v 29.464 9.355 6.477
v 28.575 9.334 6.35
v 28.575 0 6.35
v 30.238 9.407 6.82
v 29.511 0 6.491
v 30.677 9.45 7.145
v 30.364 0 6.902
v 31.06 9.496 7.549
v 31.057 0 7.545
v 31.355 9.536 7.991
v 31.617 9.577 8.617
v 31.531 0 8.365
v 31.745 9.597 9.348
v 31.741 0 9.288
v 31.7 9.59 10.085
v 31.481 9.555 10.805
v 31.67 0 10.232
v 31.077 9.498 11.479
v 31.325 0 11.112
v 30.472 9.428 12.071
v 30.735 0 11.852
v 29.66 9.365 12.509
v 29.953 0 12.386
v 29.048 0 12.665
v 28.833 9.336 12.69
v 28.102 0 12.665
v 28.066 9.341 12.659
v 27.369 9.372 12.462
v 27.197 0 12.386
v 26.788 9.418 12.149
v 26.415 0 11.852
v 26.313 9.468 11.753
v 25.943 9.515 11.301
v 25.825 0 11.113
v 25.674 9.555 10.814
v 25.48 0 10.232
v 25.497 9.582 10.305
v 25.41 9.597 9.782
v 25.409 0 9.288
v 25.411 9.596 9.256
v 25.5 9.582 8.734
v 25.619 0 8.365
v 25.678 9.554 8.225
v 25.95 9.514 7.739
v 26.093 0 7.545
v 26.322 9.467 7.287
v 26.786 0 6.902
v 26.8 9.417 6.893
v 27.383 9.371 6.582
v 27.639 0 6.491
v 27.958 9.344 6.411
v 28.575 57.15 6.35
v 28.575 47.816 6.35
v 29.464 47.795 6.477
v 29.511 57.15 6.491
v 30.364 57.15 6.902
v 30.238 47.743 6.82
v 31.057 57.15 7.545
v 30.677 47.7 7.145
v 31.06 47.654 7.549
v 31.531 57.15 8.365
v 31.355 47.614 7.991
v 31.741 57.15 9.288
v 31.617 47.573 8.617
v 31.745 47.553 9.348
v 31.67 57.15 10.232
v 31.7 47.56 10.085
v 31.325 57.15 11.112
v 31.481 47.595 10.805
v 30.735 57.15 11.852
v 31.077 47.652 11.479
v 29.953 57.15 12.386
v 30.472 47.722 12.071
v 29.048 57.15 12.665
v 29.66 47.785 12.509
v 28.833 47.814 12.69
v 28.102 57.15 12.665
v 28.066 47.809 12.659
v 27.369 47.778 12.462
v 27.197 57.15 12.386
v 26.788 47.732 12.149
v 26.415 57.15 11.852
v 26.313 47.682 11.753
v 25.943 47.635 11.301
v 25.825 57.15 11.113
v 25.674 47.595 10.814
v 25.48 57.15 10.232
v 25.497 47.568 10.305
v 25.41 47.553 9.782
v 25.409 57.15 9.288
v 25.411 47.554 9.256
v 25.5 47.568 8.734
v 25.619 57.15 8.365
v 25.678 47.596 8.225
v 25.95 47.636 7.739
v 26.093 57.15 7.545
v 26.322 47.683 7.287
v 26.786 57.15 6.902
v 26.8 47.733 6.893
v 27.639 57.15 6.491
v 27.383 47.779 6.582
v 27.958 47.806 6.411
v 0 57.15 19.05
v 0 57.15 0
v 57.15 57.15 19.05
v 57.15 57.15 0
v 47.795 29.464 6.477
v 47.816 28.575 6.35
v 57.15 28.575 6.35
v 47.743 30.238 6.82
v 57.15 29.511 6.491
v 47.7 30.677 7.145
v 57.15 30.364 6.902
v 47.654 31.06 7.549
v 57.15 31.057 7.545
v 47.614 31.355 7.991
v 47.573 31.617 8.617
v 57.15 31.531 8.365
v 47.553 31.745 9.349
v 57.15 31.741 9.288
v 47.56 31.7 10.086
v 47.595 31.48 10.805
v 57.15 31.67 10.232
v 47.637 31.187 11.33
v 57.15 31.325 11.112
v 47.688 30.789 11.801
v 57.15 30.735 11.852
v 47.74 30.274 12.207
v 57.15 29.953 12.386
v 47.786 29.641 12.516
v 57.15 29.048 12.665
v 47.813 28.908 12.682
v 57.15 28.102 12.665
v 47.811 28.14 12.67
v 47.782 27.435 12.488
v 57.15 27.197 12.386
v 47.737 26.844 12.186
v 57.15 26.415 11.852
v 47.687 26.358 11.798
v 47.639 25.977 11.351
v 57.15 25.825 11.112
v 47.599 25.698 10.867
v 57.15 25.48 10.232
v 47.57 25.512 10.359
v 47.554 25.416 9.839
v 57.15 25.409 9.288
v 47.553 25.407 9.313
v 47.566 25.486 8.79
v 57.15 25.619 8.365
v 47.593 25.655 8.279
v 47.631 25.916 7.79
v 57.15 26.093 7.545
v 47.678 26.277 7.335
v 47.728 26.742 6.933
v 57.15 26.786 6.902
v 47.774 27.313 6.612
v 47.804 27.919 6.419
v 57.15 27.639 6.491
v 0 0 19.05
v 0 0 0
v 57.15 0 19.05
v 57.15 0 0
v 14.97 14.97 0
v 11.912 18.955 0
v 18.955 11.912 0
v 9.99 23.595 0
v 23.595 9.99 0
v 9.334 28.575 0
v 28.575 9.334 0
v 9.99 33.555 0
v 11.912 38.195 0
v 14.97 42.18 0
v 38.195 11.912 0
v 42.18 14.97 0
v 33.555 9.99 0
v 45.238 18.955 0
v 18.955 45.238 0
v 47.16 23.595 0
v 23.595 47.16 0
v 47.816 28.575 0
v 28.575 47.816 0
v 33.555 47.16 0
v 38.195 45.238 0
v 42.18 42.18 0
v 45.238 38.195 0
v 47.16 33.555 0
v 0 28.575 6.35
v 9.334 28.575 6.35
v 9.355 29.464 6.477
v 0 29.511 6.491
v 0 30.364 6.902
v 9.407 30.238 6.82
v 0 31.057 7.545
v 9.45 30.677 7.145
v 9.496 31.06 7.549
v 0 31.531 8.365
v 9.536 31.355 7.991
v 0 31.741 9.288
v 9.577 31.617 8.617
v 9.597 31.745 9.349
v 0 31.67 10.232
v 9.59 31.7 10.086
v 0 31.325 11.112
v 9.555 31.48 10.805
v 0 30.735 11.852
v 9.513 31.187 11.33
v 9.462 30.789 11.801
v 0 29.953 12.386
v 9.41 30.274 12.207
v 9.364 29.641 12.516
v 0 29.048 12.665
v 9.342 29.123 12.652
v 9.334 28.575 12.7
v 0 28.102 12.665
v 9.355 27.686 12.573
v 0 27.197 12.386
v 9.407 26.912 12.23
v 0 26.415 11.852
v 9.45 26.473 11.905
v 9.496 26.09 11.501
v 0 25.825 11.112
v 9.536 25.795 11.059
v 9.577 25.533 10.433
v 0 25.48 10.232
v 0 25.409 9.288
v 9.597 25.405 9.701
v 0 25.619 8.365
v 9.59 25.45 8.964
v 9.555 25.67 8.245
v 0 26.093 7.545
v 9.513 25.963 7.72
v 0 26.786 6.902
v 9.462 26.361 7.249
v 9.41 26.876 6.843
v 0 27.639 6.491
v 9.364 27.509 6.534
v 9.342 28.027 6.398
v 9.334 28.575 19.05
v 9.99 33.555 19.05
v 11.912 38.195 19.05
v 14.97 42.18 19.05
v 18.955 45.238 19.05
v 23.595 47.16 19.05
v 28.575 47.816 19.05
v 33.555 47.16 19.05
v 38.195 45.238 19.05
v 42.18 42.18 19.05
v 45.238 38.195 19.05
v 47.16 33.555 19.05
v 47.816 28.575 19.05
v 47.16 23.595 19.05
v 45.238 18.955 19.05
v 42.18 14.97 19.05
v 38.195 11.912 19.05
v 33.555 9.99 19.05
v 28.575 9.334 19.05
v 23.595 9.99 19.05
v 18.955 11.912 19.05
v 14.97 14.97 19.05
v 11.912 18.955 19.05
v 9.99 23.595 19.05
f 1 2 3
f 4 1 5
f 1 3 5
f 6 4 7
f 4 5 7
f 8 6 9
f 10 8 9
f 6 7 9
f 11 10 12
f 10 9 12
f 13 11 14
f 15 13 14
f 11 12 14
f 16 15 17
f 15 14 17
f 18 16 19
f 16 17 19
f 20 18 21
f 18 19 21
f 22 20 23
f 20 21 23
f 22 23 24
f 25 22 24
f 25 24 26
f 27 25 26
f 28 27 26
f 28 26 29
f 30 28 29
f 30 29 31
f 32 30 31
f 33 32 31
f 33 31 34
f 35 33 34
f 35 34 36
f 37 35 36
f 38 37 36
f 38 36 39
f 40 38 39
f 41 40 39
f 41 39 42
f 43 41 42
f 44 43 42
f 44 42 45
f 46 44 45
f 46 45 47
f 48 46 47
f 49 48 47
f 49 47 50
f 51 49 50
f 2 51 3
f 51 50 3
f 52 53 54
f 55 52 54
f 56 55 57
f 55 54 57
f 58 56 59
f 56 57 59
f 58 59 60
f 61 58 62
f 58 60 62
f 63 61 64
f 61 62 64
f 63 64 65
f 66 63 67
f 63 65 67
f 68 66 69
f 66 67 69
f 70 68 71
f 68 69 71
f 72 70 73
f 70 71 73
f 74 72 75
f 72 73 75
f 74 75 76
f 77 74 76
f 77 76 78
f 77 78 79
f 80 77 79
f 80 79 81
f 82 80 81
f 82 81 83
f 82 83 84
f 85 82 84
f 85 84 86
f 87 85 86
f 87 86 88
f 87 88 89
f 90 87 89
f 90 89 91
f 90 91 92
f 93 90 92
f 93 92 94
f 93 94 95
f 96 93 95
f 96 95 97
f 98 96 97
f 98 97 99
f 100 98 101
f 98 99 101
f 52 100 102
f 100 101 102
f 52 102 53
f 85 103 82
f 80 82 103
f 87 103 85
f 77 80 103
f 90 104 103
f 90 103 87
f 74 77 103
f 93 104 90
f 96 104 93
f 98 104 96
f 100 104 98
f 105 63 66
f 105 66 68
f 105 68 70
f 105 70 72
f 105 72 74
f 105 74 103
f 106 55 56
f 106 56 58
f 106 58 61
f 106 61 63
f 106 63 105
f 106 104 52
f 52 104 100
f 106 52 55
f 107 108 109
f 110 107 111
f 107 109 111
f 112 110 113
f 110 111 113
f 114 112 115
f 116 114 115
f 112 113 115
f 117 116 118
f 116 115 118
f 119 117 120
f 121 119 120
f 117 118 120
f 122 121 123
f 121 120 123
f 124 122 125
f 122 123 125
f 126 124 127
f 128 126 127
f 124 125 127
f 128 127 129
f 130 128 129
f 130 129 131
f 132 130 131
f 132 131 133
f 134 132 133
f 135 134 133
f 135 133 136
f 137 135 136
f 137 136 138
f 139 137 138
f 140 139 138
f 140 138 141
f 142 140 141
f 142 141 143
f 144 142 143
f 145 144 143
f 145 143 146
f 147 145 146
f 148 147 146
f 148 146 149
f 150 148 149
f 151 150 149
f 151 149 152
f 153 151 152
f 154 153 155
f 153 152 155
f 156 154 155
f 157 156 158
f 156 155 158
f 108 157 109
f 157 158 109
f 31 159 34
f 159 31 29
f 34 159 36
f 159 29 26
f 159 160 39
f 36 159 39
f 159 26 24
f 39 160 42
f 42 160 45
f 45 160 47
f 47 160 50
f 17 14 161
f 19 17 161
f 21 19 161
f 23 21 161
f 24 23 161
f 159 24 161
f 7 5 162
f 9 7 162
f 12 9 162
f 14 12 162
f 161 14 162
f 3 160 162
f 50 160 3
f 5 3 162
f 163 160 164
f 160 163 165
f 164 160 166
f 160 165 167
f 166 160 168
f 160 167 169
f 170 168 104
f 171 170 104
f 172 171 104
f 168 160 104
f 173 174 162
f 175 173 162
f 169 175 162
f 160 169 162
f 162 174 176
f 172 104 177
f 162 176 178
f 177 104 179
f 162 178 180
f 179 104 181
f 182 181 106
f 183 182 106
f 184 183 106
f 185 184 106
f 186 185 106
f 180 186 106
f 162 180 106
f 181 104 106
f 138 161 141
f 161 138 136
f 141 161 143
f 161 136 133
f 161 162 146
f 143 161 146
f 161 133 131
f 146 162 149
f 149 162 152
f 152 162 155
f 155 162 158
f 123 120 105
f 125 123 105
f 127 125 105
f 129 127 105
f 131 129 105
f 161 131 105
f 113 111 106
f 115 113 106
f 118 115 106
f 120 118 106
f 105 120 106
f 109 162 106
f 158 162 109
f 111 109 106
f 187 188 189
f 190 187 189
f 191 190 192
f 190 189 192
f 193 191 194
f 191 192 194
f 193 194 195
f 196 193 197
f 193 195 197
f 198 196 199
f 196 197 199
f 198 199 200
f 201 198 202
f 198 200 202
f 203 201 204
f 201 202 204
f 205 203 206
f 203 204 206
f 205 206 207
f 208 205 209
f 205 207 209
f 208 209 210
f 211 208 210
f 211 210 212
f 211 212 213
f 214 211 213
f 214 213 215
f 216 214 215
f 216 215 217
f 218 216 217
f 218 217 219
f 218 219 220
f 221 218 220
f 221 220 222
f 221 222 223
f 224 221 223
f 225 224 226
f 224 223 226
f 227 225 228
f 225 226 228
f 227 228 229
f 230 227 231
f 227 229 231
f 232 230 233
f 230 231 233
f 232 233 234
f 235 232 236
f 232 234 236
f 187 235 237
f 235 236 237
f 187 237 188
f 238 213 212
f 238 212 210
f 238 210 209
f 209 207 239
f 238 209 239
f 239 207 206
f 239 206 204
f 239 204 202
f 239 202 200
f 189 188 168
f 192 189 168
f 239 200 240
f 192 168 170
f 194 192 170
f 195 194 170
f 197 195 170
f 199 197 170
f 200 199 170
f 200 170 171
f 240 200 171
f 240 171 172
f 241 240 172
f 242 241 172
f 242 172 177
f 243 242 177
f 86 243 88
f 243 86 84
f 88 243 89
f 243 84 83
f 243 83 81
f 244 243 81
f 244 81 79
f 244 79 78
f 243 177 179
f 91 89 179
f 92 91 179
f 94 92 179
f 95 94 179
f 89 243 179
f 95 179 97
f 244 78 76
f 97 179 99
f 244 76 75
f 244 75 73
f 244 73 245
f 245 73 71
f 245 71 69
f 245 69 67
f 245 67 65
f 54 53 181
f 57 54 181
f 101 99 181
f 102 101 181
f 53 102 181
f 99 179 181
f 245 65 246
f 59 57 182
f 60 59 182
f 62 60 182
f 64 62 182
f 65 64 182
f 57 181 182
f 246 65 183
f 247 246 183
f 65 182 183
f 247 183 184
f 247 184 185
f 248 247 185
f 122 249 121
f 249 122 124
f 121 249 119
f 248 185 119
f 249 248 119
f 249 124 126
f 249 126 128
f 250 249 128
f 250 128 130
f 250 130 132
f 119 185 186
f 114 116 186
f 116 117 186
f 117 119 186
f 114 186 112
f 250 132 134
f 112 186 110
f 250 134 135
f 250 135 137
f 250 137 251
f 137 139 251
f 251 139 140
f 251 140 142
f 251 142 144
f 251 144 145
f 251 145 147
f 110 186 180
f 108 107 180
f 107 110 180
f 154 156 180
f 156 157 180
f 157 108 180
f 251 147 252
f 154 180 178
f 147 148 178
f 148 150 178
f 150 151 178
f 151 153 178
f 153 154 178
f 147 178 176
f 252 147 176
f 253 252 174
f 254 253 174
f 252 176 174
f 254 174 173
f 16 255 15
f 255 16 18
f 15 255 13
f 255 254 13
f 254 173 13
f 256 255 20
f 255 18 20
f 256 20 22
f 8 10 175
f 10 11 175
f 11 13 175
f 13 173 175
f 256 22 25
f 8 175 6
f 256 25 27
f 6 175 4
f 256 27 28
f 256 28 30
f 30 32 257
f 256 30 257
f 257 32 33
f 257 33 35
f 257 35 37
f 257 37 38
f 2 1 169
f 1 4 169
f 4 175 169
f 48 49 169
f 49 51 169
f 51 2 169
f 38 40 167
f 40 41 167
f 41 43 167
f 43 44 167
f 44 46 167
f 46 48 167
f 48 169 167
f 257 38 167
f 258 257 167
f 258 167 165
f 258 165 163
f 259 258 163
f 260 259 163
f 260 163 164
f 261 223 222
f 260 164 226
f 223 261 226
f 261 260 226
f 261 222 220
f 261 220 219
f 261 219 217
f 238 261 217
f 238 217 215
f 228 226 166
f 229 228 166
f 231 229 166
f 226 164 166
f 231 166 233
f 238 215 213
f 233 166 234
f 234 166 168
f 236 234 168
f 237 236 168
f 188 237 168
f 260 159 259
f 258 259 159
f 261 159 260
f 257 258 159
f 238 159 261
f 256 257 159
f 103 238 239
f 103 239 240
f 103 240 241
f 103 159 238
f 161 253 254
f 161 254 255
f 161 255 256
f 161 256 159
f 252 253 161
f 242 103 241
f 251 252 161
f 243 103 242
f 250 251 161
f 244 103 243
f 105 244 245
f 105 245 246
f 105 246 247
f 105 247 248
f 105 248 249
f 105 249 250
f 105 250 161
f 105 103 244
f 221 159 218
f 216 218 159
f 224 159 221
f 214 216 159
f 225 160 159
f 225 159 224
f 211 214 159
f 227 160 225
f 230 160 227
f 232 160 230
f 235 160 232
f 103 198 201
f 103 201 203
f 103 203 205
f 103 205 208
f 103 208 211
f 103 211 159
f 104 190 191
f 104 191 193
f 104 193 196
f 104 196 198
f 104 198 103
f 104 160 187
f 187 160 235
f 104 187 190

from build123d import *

# Parameters (mm, degrees)
SKETCH1_W           = 57.15
SKETCH1_H           = 57.15
BOSS_EXTRUDE1_DEPTH = 19.05
SKETCH2_R           = 19.2405
CUT_EXTRUDE1_DEPTH  = 19.05
SKETCH5_R           = 3.175
CUT_EXTRUDE2_DEPTH  = 84.037024874
SKETCH6_R           = 3.175
CUT_EXTRUDE3_DEPTH  = 84.037024966


with BuildPart() as part:
    # Sketch1 → Boss-Extrude1 (new body)
    with BuildSketch(Plane.XY):
        with Locations((28.575, 28.575)):
            Rectangle(SKETCH1_W, SKETCH1_H)
    extrude(amount=BOSS_EXTRUDE1_DEPTH)

    # Sketch2 → Cut-Extrude1 (cut)
    with BuildSketch(Plane(origin=(0, 0, 0), x_dir=(-1, 0, 0), z_dir=(0, 0, -1))):
        with Locations((-28.575, 28.575)):
            Circle(SKETCH2_R)
    extrude(amount=-CUT_EXTRUDE1_DEPTH, mode=Mode.SUBTRACT)

    # Sketch5 → Cut-Extrude2 (cut, through all)
    with BuildSketch(Plane(origin=(57.15, 0, 0), x_dir=(0, 0, -1), z_dir=(1, 0, 0))):
        with Locations((-9.525, 28.575)):
            Circle(SKETCH5_R)
    extrude(amount=-CUT_EXTRUDE2_DEPTH, mode=Mode.SUBTRACT)

    # Sketch6 → Cut-Extrude3 (cut, through all)
    with BuildSketch(Plane.XZ):
        with Locations(Location((28.575, 9.525, 0), (0, 0, 270))):
            Circle(SKETCH6_R)
    extrude(amount=-CUT_EXTRUDE3_DEPTH, mode=Mode.SUBTRACT)


solid = part.part
